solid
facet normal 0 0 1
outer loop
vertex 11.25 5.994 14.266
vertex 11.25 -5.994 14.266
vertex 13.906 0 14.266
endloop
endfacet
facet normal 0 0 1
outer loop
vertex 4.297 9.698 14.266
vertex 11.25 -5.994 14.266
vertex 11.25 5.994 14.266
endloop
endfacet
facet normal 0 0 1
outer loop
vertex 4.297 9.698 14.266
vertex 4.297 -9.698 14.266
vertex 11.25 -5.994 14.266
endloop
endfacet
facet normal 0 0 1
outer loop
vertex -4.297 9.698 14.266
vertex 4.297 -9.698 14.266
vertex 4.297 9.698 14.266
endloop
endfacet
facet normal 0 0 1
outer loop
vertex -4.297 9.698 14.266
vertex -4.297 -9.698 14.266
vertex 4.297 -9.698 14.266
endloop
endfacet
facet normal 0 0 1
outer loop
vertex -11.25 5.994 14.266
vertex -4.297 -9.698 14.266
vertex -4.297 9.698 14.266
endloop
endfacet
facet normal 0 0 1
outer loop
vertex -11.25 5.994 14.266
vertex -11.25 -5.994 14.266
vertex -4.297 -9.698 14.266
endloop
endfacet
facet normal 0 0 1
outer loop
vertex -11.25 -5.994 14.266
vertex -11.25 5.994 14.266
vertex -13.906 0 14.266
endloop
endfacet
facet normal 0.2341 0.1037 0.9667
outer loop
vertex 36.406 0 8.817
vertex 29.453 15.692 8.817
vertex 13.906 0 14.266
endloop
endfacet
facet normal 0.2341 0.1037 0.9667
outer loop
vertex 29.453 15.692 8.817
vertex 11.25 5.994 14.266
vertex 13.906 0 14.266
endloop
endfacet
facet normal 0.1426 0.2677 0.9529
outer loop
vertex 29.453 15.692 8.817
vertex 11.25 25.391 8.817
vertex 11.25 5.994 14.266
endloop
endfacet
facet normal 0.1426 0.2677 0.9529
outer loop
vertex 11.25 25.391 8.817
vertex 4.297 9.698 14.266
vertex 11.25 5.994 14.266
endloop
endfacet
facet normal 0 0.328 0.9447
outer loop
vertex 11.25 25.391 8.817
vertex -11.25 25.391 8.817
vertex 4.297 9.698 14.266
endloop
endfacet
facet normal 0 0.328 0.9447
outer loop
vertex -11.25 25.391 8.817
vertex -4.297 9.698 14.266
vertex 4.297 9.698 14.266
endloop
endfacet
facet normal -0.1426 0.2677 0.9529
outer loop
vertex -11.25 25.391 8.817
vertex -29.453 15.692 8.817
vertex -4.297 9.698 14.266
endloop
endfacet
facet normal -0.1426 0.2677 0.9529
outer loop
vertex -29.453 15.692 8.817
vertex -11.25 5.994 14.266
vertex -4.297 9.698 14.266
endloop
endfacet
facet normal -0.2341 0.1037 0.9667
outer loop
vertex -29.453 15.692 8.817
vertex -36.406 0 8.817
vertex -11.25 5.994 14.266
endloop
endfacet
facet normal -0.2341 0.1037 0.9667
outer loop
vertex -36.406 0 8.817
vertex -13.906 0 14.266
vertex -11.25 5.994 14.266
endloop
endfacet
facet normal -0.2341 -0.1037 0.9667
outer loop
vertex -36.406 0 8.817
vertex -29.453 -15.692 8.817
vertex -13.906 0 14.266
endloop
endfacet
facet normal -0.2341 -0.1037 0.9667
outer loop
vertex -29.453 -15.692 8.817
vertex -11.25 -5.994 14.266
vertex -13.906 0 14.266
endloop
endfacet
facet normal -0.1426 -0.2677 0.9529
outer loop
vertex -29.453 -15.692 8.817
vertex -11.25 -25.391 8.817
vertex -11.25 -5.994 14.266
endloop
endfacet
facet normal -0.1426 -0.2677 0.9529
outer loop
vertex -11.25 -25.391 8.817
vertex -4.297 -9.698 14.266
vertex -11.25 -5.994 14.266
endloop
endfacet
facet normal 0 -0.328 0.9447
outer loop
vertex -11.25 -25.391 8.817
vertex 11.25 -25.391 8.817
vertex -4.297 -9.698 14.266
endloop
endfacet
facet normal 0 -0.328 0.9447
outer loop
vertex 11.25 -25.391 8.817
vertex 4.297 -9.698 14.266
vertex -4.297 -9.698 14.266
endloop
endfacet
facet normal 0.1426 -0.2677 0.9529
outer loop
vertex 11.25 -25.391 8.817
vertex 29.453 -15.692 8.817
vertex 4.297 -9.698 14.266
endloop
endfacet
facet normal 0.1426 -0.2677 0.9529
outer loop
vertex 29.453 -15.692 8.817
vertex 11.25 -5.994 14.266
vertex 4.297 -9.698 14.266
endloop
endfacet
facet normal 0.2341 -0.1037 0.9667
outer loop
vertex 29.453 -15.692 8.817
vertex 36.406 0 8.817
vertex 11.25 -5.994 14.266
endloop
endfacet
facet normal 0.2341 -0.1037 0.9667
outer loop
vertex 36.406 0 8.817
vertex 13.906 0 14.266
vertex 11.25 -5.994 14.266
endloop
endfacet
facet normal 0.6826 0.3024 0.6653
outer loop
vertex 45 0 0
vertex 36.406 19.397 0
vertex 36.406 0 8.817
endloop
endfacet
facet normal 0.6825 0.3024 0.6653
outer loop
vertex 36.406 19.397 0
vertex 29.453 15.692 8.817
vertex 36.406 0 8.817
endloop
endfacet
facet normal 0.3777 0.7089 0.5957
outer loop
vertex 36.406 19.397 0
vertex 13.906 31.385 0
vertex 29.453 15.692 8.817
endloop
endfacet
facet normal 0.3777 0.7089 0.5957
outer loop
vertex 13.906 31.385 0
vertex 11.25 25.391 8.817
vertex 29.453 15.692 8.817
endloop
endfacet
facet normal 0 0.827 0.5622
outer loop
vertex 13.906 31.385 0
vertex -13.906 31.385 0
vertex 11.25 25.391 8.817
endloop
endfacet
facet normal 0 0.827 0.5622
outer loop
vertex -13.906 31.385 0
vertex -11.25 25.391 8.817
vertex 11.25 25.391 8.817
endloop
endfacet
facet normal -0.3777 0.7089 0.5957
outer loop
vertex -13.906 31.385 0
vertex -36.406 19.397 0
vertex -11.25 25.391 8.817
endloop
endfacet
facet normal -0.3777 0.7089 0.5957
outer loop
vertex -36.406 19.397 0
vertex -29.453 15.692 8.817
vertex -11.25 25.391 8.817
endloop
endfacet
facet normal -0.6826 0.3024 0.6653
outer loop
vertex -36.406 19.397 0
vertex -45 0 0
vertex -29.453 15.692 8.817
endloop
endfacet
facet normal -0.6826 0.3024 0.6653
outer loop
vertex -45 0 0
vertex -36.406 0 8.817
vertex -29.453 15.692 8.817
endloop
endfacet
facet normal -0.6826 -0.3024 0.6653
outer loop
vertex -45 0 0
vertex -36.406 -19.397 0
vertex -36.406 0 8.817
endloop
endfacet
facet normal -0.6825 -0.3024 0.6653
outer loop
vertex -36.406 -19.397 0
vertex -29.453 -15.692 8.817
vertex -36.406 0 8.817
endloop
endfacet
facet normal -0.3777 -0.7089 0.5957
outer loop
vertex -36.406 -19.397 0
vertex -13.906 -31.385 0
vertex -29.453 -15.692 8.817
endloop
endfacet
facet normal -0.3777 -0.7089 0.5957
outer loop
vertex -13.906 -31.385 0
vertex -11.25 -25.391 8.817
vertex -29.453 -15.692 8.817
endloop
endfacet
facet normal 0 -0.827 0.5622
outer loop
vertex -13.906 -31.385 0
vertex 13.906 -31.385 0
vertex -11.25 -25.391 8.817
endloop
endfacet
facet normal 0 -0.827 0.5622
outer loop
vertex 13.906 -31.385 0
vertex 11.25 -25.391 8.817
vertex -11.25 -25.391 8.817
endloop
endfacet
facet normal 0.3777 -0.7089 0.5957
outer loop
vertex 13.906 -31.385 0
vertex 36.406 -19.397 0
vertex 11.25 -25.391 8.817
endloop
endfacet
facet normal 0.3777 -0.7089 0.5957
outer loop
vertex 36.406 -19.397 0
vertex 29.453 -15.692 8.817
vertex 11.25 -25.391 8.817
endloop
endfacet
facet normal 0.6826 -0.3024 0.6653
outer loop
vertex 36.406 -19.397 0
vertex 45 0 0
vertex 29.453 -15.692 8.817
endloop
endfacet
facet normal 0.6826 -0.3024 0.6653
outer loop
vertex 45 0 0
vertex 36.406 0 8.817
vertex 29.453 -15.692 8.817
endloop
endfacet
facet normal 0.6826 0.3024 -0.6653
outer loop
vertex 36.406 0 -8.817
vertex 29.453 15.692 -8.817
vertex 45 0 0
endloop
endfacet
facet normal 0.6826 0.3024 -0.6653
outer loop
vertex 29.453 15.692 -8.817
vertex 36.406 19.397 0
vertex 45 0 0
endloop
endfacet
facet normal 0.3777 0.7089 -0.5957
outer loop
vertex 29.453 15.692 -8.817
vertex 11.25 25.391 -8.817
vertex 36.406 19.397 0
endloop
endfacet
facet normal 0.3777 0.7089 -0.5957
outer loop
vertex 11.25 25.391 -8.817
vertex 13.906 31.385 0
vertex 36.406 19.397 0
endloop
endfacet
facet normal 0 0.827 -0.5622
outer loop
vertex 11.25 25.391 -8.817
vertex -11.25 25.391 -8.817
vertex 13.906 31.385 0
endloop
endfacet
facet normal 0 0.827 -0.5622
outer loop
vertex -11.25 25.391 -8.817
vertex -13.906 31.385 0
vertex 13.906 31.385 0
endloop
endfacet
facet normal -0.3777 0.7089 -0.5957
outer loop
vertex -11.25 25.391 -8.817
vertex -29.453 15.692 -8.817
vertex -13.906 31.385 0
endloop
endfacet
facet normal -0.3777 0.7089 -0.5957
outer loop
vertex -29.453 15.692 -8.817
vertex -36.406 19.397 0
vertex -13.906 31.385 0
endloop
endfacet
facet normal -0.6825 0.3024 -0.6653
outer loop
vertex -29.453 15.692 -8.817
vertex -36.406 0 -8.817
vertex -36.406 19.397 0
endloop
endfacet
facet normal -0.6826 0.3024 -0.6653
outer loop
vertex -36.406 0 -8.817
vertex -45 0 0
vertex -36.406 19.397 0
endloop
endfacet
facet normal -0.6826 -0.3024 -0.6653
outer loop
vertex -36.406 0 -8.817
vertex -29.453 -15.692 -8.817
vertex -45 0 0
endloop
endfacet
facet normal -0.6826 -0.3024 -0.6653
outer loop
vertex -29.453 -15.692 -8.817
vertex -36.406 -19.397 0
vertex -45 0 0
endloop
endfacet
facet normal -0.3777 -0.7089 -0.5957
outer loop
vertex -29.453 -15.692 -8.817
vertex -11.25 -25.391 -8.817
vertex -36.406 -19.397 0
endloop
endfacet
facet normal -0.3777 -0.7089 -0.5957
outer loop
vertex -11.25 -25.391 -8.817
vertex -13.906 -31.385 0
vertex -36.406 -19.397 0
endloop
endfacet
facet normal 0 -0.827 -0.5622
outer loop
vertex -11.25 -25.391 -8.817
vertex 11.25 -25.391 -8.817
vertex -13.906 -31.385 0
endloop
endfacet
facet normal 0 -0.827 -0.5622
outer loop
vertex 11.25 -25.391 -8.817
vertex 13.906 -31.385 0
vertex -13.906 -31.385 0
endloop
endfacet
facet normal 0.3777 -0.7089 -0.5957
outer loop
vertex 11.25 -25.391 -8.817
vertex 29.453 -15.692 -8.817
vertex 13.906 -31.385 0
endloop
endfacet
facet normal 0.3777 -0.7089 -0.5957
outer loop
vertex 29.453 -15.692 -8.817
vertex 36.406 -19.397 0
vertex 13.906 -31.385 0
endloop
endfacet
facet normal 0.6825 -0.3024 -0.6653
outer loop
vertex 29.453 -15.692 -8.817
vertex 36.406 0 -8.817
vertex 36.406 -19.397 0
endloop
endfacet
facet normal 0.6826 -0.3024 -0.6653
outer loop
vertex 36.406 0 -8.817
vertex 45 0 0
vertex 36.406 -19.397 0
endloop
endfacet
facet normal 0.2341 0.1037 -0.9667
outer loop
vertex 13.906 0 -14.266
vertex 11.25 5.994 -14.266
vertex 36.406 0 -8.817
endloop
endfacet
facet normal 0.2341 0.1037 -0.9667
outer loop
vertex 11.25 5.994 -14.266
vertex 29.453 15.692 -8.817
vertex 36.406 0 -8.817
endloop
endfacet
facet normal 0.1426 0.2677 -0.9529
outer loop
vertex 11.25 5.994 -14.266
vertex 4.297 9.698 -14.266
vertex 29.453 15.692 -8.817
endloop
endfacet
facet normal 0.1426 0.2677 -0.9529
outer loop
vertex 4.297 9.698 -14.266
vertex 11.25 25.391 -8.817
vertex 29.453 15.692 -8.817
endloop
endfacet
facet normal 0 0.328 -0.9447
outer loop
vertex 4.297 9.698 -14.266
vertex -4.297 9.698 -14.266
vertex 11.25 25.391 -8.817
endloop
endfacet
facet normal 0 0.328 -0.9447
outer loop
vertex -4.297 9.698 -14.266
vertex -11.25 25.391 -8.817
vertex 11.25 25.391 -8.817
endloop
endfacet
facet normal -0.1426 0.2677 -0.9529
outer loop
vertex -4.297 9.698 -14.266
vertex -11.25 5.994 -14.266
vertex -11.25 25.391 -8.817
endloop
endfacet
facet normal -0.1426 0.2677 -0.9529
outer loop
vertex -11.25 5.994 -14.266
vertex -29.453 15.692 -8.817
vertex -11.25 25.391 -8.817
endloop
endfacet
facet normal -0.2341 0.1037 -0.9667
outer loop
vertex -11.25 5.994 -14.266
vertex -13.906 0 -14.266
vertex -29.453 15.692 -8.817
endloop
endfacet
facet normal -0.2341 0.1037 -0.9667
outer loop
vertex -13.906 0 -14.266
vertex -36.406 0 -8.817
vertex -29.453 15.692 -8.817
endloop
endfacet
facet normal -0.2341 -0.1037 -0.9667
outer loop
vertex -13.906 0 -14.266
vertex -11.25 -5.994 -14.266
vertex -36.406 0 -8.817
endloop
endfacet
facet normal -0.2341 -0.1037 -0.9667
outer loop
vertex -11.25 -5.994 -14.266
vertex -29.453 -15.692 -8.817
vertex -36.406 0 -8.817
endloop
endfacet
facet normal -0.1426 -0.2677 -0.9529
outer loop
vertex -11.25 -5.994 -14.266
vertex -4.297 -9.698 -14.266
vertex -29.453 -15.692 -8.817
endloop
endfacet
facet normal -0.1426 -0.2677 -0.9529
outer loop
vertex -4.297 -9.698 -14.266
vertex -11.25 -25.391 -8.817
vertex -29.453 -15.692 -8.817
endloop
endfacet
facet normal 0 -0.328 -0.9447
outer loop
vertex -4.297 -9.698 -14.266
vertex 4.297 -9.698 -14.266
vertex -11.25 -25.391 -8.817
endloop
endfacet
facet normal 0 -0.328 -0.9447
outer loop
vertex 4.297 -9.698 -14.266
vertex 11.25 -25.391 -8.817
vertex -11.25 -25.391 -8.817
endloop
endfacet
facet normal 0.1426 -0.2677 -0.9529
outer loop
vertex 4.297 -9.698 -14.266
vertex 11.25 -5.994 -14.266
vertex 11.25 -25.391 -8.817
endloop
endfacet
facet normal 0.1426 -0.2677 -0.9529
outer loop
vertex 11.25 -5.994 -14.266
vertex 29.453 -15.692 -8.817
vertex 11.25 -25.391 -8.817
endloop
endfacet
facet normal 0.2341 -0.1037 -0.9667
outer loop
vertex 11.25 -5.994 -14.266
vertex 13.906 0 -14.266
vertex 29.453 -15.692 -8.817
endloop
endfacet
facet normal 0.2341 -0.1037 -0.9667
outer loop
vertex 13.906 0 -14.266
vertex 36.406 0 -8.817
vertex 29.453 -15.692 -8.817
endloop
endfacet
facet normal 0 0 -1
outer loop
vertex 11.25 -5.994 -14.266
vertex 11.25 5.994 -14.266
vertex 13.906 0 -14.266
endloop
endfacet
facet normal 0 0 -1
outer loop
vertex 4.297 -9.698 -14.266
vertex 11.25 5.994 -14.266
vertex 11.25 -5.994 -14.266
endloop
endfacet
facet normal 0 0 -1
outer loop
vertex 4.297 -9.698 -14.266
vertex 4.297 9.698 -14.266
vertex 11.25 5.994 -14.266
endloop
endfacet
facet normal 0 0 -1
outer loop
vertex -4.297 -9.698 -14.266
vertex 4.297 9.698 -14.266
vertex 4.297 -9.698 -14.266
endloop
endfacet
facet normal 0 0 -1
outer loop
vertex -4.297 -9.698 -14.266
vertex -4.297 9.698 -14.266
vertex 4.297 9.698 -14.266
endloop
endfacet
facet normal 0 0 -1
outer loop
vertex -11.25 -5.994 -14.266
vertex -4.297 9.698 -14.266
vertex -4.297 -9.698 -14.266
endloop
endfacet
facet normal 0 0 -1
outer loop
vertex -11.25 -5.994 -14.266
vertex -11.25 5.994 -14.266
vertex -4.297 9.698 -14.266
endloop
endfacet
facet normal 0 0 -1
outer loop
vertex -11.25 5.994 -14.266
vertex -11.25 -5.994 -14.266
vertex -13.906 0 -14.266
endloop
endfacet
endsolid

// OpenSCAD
// Generated by SolidPython 1.0.1 on 2020-07-29 00:46:52


scale(v = [15, 11, 5]) {
	sphere(r = 3);
}
/***********************************************
*********      SolidPython code:      **********
************************************************
 
# import packages: SolidPython
from solid import *
from solid.utils import *
from itertools import chain, combinations, permutations


class Resize:

    def __init__(self, scad_file):
        self.scad_file = scad_file
        #self.scad_file = import_scad(scad_file)
        # cone/cylinder param:
        self.r1 = 0
        self.r2 = 0
        self.h = 0
        # rectangular prism param:
        self.w = 0
        self.l = 0
        # ellipse param:
        self.r = 0

    # import OpenScad code (file name corresponds to shape)


    # classify shape + parameters
    def assign(self, param1, param2, param3):
        if self.scad_file == 'cone.scad':
            self.r1 = param1
            self.r2 = param2
            self.h = param3
        elif self.scad_file == 'cylinder.scad':
            self.r1 = param1
            self.r2 = param2
            self.h = param3
        elif self.scad_file == 'rectangularPrism.scad':
            self.h = param1
            self.l = param2
            self.w = param3
        else:
            self.r = param1
            self.h = param2

    # resize parameters
    def iterate(self):
        x = range(3, 20, 2)
        i = 1
        if self.scad_file == 'cone.scad':
            tempList = list(permutations(x, 2))
            for temp in tempList:
                param1 = temp[0]
                param2 = temp[1]
                filepath = 'produced_scad_files/' + 'cone' + str(param1) + '_' + str(param2) + '_' + '.scad'
                scad_render_to_file(cylinder(h=param1, r1=param2, r2=0), filepath)

        elif self.scad_file == 'cylinder.scad':
            tempList = list(permutations(x, 3))
            for temp in tempList:
                param1 = temp[0]
                param2 = temp[1]
                filepath = 'produced_scad_files/' + 'cylinder' + str(param1) + '_' + str(param2) + '_' + '.scad'
                scad_render_to_file(cylinder(h=param1, r1=param2, r2=param2), filepath)

        elif self.scad_file == 'rectangularPrism.scad':
            tempList = list(permutations(x, 3))
            for temp in tempList:
                param1 = temp[0]
                param2 = temp[1]
                param3 = temp[2]
                filepath = 'produced_scad_files/' + 'rectangularPrism' + str(param1) + '_' + str(param2) + '_' + str(
                    param3) + '.scad'
                scad_render_to_file(cube(size=(param1, param2, param3)), filepath)

        elif self.scad_file == 'ellipse.scad':
            tempList = list(permutations(x, 4))
            for temp in tempList:
                param1 = temp[0]
                param2 = temp[1]
                param3 = temp[2]
                param4 = temp[3]
                filepath = 'produced_scad_files/' + 'ellipse' + str(param1) + '_' + str(param2) + '_' + str(param3) + '_' + str(param4) + '.scad'
                scad_render_to_file(scale([param1, param2, param3])(sphere(r=param4)), filepath)

    def render_to_scadfile(self):
        scad_render_to_file(scad, 'example.scad') 
 
************************************************/
